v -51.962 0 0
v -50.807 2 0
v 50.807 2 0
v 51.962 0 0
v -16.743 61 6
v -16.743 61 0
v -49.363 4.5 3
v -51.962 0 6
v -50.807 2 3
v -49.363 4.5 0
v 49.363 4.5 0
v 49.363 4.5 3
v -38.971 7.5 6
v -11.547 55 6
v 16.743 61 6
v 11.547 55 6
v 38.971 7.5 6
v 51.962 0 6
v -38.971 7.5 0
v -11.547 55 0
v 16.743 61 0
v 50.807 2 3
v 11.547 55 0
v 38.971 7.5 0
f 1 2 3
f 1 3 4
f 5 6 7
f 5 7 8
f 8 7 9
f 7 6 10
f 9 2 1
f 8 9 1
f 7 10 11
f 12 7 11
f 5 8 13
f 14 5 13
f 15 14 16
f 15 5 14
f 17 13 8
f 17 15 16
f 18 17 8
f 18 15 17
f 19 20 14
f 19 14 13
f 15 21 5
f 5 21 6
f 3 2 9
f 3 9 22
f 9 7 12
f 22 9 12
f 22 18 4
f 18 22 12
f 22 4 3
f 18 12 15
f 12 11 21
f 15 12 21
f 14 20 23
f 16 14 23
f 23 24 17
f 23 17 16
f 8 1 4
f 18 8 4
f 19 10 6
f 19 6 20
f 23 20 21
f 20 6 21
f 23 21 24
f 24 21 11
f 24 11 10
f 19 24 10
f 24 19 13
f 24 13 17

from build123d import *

# Parameters (mm, degrees)
BOX003_W                 = 220
BOX003_H                 = 2.5
BOX003_DEPTH             = 3
EXTRUDE001_DEPTH         = 10
BOX002_W                 = 220
BOX002_H                 = 113
BOX002_DEPTH             = 8
BOX001_W                 = 32
BOX001_H                 = 6
BOX001_DEPTH             = 6
PRISM003_DEPTH           = 6
PRISM003_PLACEMENT_ANGLE = 30
PRISM002_DEPTH           = 6
PRISM002_PLACEMENT_ANGLE = 30


with BuildPart() as cube003:
    # Box003 → Box003 (new body)
    with BuildSketch(Plane(origin=(-110, 2, 0), x_dir=(1, 0, 0), z_dir=(0, 0, 1))):
        with Locations((110, 1.25)):
            Rectangle(BOX003_W, BOX003_H)
    extrude(amount=BOX003_DEPTH)


with BuildPart() as extrude001:
    # Sketch002 → Extrude001 (new body)
    with BuildSketch(Plane.XY):
        Polygon((-95, 0), (95, 0), (85, 61), (-85, 61), align=None)
    extrude(amount=EXTRUDE001_DEPTH)


with BuildPart() as molde_cortador001:
    # Box002 → Box002 (new body)
    with BuildSketch(Plane(origin=(-110, -15, 0), x_dir=(1, 0, 0), z_dir=(0, 0, 1))):
        with Locations((110, 56.5)):
            Rectangle(BOX002_W, BOX002_H)
    extrude(amount=BOX002_DEPTH)

    # Cut002: cut Extrude001
    add(extrude001.part, mode=Mode.SUBTRACT)


with BuildPart() as cube001:
    # Box001 → Box001 (new body)
    with BuildSketch(Plane(origin=(-16, 55, 0), x_dir=(1, 0, 0), z_dir=(0, 0, 1))):
        with Locations((16, 3)):
            Rectangle(BOX001_W, BOX001_H)
    extrude(amount=BOX001_DEPTH)


with BuildPart() as prism003:
    # Prism003 → Prism003 (new body)
    with BuildSketch(Plane.XY):
        Polygon((45, 0), (-22.5, 38.971143), (-22.5, -38.971143), align=None)
    extrude(amount=PRISM003_DEPTH)


with BuildPart() as prism003_1:
    # Prism003 placement: moved
    add(prism003.part.moved(Location((0, 23, 0))).rotate(Axis((0, 23, 0), (0, 0, -1)), PRISM003_PLACEMENT_ANGLE))


with BuildPart() as base_triangulo_con_canaleta:
    # Prism002 → Prism002 (new body)
    with BuildSketch(Plane.XY):
        Polygon((60, 0), (-30, 51.961524), (-30, -51.961524), align=None)
    extrude(amount=PRISM002_DEPTH)


with BuildPart() as base_triangulo_con_canaleta_1:
    # Prism002 placement: moved
    add(base_triangulo_con_canaleta.part.moved(Location((0, 23, 0))).rotate(Axis((0, 23, 0), (0, 0, -1)), PRISM002_PLACEMENT_ANGLE))

    # Cut001: cut Prism003
    add(prism003_1.part, mode=Mode.SUBTRACT)


with BuildPart() as base_triangulo_con_canaleta_2:
    # Cut001 placement: moved
    add(base_triangulo_con_canaleta_1.part.moved(Location((0, 7, 0))))

    # Fusion: union Cube001
    add(cube001.part)

    # Cut003: cut molde_cortador001
    add(molde_cortador001.part, mode=Mode.SUBTRACT)

    # Cut004: cut Cube003
    add(cube003.part, mode=Mode.SUBTRACT)


solid = base_triangulo_con_canaleta_2.part
